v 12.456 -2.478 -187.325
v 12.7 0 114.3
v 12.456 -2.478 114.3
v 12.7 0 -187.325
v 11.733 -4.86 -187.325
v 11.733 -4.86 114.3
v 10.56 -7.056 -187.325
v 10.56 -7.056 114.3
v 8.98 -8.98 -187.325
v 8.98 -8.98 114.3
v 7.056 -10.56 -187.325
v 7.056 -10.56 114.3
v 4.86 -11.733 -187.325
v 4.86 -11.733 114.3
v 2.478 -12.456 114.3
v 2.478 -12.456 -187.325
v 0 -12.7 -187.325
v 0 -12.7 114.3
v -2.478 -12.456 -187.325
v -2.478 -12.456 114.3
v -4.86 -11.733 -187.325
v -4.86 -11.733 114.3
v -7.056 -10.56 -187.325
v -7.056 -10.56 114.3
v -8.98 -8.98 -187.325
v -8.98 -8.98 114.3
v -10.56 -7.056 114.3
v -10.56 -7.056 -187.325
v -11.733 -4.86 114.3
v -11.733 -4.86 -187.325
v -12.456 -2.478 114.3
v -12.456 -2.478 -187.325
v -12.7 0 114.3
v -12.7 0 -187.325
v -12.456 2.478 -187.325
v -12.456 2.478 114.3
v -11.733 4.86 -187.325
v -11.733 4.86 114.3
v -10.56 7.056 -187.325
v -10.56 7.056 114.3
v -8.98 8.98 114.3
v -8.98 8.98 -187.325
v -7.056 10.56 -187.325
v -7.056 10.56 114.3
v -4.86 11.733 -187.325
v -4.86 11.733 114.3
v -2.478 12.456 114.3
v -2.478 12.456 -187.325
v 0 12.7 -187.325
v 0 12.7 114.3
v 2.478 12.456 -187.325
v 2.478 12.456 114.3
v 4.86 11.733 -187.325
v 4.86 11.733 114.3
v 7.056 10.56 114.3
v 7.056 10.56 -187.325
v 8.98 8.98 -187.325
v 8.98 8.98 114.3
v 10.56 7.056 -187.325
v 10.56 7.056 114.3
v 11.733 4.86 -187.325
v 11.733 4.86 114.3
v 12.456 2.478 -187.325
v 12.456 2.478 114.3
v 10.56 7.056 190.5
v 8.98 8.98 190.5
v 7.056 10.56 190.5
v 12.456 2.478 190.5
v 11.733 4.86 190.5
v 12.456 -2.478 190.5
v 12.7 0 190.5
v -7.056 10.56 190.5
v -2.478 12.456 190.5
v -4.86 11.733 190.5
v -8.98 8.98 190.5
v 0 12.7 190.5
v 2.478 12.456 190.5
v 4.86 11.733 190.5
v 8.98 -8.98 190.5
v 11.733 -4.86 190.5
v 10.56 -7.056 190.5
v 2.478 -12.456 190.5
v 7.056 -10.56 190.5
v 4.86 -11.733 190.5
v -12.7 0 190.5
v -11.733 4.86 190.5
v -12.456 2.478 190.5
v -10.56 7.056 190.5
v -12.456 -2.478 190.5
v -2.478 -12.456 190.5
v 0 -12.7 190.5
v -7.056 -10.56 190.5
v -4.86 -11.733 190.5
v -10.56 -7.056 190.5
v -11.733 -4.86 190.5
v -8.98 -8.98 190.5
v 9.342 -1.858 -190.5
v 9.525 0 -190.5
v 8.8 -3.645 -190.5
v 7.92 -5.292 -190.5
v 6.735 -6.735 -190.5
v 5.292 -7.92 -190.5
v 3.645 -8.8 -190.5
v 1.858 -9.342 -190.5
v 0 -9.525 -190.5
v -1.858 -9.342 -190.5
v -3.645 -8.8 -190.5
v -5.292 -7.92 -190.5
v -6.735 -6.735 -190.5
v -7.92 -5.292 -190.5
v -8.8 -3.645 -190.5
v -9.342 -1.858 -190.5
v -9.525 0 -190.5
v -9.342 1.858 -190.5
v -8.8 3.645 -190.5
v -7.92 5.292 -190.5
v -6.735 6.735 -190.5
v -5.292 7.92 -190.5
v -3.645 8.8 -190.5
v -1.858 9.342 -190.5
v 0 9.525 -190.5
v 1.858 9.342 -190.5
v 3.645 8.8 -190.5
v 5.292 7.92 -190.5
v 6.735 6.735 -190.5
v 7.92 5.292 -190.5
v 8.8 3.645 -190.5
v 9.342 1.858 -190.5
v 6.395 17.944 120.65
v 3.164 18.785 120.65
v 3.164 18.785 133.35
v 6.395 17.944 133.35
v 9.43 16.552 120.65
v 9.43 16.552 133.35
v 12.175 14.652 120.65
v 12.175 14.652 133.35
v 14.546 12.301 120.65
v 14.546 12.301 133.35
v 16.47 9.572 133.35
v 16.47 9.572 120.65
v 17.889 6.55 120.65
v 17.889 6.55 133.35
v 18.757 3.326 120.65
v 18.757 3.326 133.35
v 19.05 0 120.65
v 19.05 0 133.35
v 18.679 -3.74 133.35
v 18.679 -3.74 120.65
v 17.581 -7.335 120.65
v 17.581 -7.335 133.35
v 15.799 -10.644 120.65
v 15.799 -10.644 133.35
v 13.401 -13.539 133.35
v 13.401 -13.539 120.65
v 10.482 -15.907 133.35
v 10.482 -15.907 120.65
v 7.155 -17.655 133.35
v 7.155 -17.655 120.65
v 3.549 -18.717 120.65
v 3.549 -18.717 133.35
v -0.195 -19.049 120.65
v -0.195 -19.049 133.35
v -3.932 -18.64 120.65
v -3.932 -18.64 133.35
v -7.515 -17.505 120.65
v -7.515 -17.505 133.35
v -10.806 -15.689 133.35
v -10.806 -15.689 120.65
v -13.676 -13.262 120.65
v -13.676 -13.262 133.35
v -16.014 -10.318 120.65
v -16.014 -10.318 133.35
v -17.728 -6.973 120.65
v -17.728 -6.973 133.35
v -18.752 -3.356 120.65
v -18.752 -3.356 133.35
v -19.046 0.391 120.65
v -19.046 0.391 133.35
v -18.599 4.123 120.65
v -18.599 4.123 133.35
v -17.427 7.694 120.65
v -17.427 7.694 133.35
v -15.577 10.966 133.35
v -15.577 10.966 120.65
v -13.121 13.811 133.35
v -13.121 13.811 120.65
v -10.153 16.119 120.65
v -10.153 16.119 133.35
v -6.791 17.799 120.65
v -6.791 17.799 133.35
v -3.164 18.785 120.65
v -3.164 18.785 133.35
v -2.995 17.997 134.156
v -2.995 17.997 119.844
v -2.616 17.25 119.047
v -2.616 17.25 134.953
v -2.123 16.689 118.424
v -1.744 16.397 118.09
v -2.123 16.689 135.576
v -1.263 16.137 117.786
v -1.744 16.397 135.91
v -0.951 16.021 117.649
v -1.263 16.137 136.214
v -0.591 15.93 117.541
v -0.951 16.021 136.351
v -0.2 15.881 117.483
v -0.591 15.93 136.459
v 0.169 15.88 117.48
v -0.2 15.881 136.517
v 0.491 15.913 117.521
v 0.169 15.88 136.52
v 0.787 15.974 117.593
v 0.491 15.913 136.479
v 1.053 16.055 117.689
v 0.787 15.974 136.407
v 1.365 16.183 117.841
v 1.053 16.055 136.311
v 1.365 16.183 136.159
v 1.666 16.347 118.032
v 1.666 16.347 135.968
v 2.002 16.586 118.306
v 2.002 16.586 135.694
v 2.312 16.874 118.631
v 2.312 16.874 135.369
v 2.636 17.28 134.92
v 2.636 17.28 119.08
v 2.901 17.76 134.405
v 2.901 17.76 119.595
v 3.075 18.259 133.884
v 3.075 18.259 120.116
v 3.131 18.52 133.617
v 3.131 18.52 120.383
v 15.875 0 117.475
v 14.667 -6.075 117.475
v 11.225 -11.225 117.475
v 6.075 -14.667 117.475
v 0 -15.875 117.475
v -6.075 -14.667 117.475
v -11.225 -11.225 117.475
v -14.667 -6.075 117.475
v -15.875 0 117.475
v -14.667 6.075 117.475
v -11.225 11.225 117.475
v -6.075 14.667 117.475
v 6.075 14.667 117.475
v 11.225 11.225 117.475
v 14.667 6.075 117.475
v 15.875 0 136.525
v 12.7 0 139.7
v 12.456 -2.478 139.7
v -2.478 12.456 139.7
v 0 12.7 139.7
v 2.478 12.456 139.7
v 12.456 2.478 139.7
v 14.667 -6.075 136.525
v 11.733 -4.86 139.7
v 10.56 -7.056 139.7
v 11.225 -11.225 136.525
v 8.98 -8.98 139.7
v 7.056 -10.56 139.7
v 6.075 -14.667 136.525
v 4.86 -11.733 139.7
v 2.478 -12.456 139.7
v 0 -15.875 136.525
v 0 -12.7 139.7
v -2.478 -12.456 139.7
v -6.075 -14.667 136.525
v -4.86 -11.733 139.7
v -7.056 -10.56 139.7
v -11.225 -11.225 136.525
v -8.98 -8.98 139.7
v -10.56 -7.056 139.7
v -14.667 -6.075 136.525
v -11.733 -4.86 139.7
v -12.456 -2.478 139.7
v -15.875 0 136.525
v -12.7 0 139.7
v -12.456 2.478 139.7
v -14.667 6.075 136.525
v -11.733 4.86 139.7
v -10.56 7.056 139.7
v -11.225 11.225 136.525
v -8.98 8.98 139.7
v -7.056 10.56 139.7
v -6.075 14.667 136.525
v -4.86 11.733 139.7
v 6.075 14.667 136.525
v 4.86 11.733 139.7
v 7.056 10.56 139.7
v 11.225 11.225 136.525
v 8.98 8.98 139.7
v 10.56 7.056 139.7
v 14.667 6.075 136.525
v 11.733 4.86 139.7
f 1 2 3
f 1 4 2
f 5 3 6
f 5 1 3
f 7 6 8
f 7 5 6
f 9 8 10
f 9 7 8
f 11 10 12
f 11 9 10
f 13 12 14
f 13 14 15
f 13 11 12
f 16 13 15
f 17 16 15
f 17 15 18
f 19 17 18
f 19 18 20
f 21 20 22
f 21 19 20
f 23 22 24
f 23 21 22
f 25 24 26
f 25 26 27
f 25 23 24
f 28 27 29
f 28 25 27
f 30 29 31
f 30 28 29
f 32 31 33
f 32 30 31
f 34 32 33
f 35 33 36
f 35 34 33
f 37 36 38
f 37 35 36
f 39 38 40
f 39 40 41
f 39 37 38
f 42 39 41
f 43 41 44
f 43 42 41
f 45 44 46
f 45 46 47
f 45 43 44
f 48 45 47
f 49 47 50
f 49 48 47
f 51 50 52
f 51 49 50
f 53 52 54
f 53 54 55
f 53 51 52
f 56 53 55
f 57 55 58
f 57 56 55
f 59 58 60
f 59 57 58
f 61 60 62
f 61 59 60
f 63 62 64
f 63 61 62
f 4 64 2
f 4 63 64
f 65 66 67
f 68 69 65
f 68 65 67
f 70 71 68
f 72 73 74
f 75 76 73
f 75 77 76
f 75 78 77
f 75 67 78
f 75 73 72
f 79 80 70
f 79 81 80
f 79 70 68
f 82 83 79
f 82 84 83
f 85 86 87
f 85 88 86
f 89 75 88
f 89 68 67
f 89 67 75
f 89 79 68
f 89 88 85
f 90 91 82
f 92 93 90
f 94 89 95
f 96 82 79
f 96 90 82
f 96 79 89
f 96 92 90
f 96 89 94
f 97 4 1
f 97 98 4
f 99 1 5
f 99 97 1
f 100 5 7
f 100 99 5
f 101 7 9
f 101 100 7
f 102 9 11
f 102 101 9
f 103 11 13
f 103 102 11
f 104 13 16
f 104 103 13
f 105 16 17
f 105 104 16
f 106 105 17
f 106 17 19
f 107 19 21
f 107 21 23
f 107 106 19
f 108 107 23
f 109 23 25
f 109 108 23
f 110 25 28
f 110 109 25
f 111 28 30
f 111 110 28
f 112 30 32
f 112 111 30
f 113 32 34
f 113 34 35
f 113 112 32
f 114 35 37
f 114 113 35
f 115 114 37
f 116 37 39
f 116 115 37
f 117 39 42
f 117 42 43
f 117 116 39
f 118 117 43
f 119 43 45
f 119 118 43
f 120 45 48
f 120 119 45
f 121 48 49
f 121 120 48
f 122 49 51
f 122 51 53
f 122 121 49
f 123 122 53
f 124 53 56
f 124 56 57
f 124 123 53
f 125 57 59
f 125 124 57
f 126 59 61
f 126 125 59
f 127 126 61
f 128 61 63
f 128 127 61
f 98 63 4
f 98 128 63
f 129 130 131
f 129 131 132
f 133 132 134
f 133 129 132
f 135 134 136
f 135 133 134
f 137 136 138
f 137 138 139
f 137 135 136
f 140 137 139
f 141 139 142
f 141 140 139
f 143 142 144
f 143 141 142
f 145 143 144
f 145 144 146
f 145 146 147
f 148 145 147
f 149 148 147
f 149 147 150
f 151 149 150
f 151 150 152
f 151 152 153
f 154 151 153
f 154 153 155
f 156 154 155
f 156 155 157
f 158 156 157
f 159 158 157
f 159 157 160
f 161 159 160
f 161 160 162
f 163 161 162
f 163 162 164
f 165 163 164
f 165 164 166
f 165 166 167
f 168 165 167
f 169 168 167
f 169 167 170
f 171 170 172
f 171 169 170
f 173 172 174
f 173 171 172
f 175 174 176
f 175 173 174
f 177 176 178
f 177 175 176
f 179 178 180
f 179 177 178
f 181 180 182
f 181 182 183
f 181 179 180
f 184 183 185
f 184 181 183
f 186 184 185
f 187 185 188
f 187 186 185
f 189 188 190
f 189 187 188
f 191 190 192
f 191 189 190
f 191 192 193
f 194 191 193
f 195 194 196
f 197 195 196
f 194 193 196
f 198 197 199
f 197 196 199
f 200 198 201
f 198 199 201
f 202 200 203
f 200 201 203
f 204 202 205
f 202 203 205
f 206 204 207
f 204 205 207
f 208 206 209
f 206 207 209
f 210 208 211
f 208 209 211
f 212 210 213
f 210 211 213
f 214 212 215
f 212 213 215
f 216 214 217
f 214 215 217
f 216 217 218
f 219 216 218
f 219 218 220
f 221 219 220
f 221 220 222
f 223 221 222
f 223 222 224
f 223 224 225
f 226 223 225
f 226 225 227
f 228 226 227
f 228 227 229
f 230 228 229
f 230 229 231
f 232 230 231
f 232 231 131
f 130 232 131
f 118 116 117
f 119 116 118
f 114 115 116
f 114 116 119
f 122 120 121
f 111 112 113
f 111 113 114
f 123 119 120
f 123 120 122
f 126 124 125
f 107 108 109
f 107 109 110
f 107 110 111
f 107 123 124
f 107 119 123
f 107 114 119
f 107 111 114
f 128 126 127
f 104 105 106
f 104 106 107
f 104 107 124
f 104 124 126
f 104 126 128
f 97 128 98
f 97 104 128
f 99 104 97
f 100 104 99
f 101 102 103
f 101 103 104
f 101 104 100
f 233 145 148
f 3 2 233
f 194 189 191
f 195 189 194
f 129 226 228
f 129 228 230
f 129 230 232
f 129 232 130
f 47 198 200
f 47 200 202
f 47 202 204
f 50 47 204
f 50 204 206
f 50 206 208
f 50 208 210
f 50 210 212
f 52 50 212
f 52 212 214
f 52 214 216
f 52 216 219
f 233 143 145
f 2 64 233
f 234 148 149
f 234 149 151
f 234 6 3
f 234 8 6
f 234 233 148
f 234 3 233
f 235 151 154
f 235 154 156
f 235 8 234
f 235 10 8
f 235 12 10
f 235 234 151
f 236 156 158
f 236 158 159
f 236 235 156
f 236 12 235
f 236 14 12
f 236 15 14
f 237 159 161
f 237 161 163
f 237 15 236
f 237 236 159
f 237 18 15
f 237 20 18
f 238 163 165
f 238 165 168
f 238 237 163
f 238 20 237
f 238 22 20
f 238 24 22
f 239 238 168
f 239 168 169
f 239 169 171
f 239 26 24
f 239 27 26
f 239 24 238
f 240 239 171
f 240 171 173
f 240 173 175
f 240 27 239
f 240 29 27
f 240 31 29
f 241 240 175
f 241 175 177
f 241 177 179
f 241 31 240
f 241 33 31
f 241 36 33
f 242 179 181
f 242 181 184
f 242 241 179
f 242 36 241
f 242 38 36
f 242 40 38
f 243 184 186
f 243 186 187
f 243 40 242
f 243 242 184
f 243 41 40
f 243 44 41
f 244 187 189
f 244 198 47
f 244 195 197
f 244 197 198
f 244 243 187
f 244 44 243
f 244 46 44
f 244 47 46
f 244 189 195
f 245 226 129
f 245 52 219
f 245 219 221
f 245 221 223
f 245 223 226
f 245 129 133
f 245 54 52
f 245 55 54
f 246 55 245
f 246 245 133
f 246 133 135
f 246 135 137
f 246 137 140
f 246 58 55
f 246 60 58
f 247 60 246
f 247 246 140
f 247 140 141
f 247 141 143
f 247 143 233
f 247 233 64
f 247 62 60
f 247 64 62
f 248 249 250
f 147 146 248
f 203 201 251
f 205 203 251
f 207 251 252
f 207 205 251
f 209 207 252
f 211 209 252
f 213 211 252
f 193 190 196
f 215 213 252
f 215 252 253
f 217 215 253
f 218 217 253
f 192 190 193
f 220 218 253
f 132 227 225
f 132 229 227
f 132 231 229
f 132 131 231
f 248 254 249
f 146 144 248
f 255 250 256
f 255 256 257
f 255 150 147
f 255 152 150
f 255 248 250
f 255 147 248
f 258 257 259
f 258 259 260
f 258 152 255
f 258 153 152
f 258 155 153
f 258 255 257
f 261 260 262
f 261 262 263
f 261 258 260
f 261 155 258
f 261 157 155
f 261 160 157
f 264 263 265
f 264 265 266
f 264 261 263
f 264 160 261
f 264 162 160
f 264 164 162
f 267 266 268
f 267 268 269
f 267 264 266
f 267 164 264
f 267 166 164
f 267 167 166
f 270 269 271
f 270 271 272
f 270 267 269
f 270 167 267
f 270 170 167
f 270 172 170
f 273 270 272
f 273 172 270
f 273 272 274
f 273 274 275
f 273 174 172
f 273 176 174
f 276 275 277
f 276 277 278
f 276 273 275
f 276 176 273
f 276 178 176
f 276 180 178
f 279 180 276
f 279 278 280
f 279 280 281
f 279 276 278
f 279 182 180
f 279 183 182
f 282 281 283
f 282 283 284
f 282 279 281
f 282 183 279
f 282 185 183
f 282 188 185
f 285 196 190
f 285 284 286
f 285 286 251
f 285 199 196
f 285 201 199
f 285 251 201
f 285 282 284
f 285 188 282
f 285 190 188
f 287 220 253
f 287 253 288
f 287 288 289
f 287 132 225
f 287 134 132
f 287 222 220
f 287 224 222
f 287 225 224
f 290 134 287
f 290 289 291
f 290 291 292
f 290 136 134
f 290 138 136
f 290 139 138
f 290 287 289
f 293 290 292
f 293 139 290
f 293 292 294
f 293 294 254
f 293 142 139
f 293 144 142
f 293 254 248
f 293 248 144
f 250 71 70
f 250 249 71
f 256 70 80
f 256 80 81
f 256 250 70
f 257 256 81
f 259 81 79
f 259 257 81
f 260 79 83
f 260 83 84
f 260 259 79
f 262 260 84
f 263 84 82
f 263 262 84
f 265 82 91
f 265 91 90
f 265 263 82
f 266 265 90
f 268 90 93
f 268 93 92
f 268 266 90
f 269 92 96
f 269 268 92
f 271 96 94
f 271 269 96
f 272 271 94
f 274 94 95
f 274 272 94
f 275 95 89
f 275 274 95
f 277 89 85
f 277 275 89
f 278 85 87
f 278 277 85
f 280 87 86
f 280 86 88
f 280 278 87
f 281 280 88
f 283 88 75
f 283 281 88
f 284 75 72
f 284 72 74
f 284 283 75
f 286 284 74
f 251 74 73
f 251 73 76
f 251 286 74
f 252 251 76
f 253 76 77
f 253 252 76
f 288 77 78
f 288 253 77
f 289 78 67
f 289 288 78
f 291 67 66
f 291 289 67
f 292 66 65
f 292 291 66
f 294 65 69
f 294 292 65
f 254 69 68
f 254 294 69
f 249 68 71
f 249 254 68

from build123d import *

# Parameters (mm, degrees)
CUT_EXTRUDE1_REACH = 383
SKETCH4_R          = 3.175


with BuildPart() as part:
    # Sketch2 → Revolve1 (revolve)
    with BuildSketch(Plane(origin=(0, 0, 0), x_dir=(1, 0, 0), z_dir=(0, 1, 0))):
        Polygon((0, -190.5), (12.7, -190.5), (12.7, -139.7), (19.05, -133.35), (19.05, -120.65), (12.7, -114.3), (12.7, 187.325), (9.525, 190.5), (0, 190.5), align=None)
    revolve(axis=Axis((0, 0, 190.5), (0, 0, -1)))

    # Sketch4 → Cut-Extrude1 (cut, up to next)
    with BuildSketch(Plane.XY.offset(190.5), mode=Mode.PRIVATE) as cut_extrude1_sk1:
        with Locations((0, 19.05)):
            Circle(SKETCH4_R)
    cut_extrude1_tool1 = extrude(cut_extrude1_sk1.sketch, amount=-CUT_EXTRUDE1_REACH, mode=Mode.PRIVATE) & part.part
    add(cut_extrude1_tool1.solids().sort_by_distance((0, 19.05, 190.5))[0], mode=Mode.SUBTRACT)


solid = part.part
